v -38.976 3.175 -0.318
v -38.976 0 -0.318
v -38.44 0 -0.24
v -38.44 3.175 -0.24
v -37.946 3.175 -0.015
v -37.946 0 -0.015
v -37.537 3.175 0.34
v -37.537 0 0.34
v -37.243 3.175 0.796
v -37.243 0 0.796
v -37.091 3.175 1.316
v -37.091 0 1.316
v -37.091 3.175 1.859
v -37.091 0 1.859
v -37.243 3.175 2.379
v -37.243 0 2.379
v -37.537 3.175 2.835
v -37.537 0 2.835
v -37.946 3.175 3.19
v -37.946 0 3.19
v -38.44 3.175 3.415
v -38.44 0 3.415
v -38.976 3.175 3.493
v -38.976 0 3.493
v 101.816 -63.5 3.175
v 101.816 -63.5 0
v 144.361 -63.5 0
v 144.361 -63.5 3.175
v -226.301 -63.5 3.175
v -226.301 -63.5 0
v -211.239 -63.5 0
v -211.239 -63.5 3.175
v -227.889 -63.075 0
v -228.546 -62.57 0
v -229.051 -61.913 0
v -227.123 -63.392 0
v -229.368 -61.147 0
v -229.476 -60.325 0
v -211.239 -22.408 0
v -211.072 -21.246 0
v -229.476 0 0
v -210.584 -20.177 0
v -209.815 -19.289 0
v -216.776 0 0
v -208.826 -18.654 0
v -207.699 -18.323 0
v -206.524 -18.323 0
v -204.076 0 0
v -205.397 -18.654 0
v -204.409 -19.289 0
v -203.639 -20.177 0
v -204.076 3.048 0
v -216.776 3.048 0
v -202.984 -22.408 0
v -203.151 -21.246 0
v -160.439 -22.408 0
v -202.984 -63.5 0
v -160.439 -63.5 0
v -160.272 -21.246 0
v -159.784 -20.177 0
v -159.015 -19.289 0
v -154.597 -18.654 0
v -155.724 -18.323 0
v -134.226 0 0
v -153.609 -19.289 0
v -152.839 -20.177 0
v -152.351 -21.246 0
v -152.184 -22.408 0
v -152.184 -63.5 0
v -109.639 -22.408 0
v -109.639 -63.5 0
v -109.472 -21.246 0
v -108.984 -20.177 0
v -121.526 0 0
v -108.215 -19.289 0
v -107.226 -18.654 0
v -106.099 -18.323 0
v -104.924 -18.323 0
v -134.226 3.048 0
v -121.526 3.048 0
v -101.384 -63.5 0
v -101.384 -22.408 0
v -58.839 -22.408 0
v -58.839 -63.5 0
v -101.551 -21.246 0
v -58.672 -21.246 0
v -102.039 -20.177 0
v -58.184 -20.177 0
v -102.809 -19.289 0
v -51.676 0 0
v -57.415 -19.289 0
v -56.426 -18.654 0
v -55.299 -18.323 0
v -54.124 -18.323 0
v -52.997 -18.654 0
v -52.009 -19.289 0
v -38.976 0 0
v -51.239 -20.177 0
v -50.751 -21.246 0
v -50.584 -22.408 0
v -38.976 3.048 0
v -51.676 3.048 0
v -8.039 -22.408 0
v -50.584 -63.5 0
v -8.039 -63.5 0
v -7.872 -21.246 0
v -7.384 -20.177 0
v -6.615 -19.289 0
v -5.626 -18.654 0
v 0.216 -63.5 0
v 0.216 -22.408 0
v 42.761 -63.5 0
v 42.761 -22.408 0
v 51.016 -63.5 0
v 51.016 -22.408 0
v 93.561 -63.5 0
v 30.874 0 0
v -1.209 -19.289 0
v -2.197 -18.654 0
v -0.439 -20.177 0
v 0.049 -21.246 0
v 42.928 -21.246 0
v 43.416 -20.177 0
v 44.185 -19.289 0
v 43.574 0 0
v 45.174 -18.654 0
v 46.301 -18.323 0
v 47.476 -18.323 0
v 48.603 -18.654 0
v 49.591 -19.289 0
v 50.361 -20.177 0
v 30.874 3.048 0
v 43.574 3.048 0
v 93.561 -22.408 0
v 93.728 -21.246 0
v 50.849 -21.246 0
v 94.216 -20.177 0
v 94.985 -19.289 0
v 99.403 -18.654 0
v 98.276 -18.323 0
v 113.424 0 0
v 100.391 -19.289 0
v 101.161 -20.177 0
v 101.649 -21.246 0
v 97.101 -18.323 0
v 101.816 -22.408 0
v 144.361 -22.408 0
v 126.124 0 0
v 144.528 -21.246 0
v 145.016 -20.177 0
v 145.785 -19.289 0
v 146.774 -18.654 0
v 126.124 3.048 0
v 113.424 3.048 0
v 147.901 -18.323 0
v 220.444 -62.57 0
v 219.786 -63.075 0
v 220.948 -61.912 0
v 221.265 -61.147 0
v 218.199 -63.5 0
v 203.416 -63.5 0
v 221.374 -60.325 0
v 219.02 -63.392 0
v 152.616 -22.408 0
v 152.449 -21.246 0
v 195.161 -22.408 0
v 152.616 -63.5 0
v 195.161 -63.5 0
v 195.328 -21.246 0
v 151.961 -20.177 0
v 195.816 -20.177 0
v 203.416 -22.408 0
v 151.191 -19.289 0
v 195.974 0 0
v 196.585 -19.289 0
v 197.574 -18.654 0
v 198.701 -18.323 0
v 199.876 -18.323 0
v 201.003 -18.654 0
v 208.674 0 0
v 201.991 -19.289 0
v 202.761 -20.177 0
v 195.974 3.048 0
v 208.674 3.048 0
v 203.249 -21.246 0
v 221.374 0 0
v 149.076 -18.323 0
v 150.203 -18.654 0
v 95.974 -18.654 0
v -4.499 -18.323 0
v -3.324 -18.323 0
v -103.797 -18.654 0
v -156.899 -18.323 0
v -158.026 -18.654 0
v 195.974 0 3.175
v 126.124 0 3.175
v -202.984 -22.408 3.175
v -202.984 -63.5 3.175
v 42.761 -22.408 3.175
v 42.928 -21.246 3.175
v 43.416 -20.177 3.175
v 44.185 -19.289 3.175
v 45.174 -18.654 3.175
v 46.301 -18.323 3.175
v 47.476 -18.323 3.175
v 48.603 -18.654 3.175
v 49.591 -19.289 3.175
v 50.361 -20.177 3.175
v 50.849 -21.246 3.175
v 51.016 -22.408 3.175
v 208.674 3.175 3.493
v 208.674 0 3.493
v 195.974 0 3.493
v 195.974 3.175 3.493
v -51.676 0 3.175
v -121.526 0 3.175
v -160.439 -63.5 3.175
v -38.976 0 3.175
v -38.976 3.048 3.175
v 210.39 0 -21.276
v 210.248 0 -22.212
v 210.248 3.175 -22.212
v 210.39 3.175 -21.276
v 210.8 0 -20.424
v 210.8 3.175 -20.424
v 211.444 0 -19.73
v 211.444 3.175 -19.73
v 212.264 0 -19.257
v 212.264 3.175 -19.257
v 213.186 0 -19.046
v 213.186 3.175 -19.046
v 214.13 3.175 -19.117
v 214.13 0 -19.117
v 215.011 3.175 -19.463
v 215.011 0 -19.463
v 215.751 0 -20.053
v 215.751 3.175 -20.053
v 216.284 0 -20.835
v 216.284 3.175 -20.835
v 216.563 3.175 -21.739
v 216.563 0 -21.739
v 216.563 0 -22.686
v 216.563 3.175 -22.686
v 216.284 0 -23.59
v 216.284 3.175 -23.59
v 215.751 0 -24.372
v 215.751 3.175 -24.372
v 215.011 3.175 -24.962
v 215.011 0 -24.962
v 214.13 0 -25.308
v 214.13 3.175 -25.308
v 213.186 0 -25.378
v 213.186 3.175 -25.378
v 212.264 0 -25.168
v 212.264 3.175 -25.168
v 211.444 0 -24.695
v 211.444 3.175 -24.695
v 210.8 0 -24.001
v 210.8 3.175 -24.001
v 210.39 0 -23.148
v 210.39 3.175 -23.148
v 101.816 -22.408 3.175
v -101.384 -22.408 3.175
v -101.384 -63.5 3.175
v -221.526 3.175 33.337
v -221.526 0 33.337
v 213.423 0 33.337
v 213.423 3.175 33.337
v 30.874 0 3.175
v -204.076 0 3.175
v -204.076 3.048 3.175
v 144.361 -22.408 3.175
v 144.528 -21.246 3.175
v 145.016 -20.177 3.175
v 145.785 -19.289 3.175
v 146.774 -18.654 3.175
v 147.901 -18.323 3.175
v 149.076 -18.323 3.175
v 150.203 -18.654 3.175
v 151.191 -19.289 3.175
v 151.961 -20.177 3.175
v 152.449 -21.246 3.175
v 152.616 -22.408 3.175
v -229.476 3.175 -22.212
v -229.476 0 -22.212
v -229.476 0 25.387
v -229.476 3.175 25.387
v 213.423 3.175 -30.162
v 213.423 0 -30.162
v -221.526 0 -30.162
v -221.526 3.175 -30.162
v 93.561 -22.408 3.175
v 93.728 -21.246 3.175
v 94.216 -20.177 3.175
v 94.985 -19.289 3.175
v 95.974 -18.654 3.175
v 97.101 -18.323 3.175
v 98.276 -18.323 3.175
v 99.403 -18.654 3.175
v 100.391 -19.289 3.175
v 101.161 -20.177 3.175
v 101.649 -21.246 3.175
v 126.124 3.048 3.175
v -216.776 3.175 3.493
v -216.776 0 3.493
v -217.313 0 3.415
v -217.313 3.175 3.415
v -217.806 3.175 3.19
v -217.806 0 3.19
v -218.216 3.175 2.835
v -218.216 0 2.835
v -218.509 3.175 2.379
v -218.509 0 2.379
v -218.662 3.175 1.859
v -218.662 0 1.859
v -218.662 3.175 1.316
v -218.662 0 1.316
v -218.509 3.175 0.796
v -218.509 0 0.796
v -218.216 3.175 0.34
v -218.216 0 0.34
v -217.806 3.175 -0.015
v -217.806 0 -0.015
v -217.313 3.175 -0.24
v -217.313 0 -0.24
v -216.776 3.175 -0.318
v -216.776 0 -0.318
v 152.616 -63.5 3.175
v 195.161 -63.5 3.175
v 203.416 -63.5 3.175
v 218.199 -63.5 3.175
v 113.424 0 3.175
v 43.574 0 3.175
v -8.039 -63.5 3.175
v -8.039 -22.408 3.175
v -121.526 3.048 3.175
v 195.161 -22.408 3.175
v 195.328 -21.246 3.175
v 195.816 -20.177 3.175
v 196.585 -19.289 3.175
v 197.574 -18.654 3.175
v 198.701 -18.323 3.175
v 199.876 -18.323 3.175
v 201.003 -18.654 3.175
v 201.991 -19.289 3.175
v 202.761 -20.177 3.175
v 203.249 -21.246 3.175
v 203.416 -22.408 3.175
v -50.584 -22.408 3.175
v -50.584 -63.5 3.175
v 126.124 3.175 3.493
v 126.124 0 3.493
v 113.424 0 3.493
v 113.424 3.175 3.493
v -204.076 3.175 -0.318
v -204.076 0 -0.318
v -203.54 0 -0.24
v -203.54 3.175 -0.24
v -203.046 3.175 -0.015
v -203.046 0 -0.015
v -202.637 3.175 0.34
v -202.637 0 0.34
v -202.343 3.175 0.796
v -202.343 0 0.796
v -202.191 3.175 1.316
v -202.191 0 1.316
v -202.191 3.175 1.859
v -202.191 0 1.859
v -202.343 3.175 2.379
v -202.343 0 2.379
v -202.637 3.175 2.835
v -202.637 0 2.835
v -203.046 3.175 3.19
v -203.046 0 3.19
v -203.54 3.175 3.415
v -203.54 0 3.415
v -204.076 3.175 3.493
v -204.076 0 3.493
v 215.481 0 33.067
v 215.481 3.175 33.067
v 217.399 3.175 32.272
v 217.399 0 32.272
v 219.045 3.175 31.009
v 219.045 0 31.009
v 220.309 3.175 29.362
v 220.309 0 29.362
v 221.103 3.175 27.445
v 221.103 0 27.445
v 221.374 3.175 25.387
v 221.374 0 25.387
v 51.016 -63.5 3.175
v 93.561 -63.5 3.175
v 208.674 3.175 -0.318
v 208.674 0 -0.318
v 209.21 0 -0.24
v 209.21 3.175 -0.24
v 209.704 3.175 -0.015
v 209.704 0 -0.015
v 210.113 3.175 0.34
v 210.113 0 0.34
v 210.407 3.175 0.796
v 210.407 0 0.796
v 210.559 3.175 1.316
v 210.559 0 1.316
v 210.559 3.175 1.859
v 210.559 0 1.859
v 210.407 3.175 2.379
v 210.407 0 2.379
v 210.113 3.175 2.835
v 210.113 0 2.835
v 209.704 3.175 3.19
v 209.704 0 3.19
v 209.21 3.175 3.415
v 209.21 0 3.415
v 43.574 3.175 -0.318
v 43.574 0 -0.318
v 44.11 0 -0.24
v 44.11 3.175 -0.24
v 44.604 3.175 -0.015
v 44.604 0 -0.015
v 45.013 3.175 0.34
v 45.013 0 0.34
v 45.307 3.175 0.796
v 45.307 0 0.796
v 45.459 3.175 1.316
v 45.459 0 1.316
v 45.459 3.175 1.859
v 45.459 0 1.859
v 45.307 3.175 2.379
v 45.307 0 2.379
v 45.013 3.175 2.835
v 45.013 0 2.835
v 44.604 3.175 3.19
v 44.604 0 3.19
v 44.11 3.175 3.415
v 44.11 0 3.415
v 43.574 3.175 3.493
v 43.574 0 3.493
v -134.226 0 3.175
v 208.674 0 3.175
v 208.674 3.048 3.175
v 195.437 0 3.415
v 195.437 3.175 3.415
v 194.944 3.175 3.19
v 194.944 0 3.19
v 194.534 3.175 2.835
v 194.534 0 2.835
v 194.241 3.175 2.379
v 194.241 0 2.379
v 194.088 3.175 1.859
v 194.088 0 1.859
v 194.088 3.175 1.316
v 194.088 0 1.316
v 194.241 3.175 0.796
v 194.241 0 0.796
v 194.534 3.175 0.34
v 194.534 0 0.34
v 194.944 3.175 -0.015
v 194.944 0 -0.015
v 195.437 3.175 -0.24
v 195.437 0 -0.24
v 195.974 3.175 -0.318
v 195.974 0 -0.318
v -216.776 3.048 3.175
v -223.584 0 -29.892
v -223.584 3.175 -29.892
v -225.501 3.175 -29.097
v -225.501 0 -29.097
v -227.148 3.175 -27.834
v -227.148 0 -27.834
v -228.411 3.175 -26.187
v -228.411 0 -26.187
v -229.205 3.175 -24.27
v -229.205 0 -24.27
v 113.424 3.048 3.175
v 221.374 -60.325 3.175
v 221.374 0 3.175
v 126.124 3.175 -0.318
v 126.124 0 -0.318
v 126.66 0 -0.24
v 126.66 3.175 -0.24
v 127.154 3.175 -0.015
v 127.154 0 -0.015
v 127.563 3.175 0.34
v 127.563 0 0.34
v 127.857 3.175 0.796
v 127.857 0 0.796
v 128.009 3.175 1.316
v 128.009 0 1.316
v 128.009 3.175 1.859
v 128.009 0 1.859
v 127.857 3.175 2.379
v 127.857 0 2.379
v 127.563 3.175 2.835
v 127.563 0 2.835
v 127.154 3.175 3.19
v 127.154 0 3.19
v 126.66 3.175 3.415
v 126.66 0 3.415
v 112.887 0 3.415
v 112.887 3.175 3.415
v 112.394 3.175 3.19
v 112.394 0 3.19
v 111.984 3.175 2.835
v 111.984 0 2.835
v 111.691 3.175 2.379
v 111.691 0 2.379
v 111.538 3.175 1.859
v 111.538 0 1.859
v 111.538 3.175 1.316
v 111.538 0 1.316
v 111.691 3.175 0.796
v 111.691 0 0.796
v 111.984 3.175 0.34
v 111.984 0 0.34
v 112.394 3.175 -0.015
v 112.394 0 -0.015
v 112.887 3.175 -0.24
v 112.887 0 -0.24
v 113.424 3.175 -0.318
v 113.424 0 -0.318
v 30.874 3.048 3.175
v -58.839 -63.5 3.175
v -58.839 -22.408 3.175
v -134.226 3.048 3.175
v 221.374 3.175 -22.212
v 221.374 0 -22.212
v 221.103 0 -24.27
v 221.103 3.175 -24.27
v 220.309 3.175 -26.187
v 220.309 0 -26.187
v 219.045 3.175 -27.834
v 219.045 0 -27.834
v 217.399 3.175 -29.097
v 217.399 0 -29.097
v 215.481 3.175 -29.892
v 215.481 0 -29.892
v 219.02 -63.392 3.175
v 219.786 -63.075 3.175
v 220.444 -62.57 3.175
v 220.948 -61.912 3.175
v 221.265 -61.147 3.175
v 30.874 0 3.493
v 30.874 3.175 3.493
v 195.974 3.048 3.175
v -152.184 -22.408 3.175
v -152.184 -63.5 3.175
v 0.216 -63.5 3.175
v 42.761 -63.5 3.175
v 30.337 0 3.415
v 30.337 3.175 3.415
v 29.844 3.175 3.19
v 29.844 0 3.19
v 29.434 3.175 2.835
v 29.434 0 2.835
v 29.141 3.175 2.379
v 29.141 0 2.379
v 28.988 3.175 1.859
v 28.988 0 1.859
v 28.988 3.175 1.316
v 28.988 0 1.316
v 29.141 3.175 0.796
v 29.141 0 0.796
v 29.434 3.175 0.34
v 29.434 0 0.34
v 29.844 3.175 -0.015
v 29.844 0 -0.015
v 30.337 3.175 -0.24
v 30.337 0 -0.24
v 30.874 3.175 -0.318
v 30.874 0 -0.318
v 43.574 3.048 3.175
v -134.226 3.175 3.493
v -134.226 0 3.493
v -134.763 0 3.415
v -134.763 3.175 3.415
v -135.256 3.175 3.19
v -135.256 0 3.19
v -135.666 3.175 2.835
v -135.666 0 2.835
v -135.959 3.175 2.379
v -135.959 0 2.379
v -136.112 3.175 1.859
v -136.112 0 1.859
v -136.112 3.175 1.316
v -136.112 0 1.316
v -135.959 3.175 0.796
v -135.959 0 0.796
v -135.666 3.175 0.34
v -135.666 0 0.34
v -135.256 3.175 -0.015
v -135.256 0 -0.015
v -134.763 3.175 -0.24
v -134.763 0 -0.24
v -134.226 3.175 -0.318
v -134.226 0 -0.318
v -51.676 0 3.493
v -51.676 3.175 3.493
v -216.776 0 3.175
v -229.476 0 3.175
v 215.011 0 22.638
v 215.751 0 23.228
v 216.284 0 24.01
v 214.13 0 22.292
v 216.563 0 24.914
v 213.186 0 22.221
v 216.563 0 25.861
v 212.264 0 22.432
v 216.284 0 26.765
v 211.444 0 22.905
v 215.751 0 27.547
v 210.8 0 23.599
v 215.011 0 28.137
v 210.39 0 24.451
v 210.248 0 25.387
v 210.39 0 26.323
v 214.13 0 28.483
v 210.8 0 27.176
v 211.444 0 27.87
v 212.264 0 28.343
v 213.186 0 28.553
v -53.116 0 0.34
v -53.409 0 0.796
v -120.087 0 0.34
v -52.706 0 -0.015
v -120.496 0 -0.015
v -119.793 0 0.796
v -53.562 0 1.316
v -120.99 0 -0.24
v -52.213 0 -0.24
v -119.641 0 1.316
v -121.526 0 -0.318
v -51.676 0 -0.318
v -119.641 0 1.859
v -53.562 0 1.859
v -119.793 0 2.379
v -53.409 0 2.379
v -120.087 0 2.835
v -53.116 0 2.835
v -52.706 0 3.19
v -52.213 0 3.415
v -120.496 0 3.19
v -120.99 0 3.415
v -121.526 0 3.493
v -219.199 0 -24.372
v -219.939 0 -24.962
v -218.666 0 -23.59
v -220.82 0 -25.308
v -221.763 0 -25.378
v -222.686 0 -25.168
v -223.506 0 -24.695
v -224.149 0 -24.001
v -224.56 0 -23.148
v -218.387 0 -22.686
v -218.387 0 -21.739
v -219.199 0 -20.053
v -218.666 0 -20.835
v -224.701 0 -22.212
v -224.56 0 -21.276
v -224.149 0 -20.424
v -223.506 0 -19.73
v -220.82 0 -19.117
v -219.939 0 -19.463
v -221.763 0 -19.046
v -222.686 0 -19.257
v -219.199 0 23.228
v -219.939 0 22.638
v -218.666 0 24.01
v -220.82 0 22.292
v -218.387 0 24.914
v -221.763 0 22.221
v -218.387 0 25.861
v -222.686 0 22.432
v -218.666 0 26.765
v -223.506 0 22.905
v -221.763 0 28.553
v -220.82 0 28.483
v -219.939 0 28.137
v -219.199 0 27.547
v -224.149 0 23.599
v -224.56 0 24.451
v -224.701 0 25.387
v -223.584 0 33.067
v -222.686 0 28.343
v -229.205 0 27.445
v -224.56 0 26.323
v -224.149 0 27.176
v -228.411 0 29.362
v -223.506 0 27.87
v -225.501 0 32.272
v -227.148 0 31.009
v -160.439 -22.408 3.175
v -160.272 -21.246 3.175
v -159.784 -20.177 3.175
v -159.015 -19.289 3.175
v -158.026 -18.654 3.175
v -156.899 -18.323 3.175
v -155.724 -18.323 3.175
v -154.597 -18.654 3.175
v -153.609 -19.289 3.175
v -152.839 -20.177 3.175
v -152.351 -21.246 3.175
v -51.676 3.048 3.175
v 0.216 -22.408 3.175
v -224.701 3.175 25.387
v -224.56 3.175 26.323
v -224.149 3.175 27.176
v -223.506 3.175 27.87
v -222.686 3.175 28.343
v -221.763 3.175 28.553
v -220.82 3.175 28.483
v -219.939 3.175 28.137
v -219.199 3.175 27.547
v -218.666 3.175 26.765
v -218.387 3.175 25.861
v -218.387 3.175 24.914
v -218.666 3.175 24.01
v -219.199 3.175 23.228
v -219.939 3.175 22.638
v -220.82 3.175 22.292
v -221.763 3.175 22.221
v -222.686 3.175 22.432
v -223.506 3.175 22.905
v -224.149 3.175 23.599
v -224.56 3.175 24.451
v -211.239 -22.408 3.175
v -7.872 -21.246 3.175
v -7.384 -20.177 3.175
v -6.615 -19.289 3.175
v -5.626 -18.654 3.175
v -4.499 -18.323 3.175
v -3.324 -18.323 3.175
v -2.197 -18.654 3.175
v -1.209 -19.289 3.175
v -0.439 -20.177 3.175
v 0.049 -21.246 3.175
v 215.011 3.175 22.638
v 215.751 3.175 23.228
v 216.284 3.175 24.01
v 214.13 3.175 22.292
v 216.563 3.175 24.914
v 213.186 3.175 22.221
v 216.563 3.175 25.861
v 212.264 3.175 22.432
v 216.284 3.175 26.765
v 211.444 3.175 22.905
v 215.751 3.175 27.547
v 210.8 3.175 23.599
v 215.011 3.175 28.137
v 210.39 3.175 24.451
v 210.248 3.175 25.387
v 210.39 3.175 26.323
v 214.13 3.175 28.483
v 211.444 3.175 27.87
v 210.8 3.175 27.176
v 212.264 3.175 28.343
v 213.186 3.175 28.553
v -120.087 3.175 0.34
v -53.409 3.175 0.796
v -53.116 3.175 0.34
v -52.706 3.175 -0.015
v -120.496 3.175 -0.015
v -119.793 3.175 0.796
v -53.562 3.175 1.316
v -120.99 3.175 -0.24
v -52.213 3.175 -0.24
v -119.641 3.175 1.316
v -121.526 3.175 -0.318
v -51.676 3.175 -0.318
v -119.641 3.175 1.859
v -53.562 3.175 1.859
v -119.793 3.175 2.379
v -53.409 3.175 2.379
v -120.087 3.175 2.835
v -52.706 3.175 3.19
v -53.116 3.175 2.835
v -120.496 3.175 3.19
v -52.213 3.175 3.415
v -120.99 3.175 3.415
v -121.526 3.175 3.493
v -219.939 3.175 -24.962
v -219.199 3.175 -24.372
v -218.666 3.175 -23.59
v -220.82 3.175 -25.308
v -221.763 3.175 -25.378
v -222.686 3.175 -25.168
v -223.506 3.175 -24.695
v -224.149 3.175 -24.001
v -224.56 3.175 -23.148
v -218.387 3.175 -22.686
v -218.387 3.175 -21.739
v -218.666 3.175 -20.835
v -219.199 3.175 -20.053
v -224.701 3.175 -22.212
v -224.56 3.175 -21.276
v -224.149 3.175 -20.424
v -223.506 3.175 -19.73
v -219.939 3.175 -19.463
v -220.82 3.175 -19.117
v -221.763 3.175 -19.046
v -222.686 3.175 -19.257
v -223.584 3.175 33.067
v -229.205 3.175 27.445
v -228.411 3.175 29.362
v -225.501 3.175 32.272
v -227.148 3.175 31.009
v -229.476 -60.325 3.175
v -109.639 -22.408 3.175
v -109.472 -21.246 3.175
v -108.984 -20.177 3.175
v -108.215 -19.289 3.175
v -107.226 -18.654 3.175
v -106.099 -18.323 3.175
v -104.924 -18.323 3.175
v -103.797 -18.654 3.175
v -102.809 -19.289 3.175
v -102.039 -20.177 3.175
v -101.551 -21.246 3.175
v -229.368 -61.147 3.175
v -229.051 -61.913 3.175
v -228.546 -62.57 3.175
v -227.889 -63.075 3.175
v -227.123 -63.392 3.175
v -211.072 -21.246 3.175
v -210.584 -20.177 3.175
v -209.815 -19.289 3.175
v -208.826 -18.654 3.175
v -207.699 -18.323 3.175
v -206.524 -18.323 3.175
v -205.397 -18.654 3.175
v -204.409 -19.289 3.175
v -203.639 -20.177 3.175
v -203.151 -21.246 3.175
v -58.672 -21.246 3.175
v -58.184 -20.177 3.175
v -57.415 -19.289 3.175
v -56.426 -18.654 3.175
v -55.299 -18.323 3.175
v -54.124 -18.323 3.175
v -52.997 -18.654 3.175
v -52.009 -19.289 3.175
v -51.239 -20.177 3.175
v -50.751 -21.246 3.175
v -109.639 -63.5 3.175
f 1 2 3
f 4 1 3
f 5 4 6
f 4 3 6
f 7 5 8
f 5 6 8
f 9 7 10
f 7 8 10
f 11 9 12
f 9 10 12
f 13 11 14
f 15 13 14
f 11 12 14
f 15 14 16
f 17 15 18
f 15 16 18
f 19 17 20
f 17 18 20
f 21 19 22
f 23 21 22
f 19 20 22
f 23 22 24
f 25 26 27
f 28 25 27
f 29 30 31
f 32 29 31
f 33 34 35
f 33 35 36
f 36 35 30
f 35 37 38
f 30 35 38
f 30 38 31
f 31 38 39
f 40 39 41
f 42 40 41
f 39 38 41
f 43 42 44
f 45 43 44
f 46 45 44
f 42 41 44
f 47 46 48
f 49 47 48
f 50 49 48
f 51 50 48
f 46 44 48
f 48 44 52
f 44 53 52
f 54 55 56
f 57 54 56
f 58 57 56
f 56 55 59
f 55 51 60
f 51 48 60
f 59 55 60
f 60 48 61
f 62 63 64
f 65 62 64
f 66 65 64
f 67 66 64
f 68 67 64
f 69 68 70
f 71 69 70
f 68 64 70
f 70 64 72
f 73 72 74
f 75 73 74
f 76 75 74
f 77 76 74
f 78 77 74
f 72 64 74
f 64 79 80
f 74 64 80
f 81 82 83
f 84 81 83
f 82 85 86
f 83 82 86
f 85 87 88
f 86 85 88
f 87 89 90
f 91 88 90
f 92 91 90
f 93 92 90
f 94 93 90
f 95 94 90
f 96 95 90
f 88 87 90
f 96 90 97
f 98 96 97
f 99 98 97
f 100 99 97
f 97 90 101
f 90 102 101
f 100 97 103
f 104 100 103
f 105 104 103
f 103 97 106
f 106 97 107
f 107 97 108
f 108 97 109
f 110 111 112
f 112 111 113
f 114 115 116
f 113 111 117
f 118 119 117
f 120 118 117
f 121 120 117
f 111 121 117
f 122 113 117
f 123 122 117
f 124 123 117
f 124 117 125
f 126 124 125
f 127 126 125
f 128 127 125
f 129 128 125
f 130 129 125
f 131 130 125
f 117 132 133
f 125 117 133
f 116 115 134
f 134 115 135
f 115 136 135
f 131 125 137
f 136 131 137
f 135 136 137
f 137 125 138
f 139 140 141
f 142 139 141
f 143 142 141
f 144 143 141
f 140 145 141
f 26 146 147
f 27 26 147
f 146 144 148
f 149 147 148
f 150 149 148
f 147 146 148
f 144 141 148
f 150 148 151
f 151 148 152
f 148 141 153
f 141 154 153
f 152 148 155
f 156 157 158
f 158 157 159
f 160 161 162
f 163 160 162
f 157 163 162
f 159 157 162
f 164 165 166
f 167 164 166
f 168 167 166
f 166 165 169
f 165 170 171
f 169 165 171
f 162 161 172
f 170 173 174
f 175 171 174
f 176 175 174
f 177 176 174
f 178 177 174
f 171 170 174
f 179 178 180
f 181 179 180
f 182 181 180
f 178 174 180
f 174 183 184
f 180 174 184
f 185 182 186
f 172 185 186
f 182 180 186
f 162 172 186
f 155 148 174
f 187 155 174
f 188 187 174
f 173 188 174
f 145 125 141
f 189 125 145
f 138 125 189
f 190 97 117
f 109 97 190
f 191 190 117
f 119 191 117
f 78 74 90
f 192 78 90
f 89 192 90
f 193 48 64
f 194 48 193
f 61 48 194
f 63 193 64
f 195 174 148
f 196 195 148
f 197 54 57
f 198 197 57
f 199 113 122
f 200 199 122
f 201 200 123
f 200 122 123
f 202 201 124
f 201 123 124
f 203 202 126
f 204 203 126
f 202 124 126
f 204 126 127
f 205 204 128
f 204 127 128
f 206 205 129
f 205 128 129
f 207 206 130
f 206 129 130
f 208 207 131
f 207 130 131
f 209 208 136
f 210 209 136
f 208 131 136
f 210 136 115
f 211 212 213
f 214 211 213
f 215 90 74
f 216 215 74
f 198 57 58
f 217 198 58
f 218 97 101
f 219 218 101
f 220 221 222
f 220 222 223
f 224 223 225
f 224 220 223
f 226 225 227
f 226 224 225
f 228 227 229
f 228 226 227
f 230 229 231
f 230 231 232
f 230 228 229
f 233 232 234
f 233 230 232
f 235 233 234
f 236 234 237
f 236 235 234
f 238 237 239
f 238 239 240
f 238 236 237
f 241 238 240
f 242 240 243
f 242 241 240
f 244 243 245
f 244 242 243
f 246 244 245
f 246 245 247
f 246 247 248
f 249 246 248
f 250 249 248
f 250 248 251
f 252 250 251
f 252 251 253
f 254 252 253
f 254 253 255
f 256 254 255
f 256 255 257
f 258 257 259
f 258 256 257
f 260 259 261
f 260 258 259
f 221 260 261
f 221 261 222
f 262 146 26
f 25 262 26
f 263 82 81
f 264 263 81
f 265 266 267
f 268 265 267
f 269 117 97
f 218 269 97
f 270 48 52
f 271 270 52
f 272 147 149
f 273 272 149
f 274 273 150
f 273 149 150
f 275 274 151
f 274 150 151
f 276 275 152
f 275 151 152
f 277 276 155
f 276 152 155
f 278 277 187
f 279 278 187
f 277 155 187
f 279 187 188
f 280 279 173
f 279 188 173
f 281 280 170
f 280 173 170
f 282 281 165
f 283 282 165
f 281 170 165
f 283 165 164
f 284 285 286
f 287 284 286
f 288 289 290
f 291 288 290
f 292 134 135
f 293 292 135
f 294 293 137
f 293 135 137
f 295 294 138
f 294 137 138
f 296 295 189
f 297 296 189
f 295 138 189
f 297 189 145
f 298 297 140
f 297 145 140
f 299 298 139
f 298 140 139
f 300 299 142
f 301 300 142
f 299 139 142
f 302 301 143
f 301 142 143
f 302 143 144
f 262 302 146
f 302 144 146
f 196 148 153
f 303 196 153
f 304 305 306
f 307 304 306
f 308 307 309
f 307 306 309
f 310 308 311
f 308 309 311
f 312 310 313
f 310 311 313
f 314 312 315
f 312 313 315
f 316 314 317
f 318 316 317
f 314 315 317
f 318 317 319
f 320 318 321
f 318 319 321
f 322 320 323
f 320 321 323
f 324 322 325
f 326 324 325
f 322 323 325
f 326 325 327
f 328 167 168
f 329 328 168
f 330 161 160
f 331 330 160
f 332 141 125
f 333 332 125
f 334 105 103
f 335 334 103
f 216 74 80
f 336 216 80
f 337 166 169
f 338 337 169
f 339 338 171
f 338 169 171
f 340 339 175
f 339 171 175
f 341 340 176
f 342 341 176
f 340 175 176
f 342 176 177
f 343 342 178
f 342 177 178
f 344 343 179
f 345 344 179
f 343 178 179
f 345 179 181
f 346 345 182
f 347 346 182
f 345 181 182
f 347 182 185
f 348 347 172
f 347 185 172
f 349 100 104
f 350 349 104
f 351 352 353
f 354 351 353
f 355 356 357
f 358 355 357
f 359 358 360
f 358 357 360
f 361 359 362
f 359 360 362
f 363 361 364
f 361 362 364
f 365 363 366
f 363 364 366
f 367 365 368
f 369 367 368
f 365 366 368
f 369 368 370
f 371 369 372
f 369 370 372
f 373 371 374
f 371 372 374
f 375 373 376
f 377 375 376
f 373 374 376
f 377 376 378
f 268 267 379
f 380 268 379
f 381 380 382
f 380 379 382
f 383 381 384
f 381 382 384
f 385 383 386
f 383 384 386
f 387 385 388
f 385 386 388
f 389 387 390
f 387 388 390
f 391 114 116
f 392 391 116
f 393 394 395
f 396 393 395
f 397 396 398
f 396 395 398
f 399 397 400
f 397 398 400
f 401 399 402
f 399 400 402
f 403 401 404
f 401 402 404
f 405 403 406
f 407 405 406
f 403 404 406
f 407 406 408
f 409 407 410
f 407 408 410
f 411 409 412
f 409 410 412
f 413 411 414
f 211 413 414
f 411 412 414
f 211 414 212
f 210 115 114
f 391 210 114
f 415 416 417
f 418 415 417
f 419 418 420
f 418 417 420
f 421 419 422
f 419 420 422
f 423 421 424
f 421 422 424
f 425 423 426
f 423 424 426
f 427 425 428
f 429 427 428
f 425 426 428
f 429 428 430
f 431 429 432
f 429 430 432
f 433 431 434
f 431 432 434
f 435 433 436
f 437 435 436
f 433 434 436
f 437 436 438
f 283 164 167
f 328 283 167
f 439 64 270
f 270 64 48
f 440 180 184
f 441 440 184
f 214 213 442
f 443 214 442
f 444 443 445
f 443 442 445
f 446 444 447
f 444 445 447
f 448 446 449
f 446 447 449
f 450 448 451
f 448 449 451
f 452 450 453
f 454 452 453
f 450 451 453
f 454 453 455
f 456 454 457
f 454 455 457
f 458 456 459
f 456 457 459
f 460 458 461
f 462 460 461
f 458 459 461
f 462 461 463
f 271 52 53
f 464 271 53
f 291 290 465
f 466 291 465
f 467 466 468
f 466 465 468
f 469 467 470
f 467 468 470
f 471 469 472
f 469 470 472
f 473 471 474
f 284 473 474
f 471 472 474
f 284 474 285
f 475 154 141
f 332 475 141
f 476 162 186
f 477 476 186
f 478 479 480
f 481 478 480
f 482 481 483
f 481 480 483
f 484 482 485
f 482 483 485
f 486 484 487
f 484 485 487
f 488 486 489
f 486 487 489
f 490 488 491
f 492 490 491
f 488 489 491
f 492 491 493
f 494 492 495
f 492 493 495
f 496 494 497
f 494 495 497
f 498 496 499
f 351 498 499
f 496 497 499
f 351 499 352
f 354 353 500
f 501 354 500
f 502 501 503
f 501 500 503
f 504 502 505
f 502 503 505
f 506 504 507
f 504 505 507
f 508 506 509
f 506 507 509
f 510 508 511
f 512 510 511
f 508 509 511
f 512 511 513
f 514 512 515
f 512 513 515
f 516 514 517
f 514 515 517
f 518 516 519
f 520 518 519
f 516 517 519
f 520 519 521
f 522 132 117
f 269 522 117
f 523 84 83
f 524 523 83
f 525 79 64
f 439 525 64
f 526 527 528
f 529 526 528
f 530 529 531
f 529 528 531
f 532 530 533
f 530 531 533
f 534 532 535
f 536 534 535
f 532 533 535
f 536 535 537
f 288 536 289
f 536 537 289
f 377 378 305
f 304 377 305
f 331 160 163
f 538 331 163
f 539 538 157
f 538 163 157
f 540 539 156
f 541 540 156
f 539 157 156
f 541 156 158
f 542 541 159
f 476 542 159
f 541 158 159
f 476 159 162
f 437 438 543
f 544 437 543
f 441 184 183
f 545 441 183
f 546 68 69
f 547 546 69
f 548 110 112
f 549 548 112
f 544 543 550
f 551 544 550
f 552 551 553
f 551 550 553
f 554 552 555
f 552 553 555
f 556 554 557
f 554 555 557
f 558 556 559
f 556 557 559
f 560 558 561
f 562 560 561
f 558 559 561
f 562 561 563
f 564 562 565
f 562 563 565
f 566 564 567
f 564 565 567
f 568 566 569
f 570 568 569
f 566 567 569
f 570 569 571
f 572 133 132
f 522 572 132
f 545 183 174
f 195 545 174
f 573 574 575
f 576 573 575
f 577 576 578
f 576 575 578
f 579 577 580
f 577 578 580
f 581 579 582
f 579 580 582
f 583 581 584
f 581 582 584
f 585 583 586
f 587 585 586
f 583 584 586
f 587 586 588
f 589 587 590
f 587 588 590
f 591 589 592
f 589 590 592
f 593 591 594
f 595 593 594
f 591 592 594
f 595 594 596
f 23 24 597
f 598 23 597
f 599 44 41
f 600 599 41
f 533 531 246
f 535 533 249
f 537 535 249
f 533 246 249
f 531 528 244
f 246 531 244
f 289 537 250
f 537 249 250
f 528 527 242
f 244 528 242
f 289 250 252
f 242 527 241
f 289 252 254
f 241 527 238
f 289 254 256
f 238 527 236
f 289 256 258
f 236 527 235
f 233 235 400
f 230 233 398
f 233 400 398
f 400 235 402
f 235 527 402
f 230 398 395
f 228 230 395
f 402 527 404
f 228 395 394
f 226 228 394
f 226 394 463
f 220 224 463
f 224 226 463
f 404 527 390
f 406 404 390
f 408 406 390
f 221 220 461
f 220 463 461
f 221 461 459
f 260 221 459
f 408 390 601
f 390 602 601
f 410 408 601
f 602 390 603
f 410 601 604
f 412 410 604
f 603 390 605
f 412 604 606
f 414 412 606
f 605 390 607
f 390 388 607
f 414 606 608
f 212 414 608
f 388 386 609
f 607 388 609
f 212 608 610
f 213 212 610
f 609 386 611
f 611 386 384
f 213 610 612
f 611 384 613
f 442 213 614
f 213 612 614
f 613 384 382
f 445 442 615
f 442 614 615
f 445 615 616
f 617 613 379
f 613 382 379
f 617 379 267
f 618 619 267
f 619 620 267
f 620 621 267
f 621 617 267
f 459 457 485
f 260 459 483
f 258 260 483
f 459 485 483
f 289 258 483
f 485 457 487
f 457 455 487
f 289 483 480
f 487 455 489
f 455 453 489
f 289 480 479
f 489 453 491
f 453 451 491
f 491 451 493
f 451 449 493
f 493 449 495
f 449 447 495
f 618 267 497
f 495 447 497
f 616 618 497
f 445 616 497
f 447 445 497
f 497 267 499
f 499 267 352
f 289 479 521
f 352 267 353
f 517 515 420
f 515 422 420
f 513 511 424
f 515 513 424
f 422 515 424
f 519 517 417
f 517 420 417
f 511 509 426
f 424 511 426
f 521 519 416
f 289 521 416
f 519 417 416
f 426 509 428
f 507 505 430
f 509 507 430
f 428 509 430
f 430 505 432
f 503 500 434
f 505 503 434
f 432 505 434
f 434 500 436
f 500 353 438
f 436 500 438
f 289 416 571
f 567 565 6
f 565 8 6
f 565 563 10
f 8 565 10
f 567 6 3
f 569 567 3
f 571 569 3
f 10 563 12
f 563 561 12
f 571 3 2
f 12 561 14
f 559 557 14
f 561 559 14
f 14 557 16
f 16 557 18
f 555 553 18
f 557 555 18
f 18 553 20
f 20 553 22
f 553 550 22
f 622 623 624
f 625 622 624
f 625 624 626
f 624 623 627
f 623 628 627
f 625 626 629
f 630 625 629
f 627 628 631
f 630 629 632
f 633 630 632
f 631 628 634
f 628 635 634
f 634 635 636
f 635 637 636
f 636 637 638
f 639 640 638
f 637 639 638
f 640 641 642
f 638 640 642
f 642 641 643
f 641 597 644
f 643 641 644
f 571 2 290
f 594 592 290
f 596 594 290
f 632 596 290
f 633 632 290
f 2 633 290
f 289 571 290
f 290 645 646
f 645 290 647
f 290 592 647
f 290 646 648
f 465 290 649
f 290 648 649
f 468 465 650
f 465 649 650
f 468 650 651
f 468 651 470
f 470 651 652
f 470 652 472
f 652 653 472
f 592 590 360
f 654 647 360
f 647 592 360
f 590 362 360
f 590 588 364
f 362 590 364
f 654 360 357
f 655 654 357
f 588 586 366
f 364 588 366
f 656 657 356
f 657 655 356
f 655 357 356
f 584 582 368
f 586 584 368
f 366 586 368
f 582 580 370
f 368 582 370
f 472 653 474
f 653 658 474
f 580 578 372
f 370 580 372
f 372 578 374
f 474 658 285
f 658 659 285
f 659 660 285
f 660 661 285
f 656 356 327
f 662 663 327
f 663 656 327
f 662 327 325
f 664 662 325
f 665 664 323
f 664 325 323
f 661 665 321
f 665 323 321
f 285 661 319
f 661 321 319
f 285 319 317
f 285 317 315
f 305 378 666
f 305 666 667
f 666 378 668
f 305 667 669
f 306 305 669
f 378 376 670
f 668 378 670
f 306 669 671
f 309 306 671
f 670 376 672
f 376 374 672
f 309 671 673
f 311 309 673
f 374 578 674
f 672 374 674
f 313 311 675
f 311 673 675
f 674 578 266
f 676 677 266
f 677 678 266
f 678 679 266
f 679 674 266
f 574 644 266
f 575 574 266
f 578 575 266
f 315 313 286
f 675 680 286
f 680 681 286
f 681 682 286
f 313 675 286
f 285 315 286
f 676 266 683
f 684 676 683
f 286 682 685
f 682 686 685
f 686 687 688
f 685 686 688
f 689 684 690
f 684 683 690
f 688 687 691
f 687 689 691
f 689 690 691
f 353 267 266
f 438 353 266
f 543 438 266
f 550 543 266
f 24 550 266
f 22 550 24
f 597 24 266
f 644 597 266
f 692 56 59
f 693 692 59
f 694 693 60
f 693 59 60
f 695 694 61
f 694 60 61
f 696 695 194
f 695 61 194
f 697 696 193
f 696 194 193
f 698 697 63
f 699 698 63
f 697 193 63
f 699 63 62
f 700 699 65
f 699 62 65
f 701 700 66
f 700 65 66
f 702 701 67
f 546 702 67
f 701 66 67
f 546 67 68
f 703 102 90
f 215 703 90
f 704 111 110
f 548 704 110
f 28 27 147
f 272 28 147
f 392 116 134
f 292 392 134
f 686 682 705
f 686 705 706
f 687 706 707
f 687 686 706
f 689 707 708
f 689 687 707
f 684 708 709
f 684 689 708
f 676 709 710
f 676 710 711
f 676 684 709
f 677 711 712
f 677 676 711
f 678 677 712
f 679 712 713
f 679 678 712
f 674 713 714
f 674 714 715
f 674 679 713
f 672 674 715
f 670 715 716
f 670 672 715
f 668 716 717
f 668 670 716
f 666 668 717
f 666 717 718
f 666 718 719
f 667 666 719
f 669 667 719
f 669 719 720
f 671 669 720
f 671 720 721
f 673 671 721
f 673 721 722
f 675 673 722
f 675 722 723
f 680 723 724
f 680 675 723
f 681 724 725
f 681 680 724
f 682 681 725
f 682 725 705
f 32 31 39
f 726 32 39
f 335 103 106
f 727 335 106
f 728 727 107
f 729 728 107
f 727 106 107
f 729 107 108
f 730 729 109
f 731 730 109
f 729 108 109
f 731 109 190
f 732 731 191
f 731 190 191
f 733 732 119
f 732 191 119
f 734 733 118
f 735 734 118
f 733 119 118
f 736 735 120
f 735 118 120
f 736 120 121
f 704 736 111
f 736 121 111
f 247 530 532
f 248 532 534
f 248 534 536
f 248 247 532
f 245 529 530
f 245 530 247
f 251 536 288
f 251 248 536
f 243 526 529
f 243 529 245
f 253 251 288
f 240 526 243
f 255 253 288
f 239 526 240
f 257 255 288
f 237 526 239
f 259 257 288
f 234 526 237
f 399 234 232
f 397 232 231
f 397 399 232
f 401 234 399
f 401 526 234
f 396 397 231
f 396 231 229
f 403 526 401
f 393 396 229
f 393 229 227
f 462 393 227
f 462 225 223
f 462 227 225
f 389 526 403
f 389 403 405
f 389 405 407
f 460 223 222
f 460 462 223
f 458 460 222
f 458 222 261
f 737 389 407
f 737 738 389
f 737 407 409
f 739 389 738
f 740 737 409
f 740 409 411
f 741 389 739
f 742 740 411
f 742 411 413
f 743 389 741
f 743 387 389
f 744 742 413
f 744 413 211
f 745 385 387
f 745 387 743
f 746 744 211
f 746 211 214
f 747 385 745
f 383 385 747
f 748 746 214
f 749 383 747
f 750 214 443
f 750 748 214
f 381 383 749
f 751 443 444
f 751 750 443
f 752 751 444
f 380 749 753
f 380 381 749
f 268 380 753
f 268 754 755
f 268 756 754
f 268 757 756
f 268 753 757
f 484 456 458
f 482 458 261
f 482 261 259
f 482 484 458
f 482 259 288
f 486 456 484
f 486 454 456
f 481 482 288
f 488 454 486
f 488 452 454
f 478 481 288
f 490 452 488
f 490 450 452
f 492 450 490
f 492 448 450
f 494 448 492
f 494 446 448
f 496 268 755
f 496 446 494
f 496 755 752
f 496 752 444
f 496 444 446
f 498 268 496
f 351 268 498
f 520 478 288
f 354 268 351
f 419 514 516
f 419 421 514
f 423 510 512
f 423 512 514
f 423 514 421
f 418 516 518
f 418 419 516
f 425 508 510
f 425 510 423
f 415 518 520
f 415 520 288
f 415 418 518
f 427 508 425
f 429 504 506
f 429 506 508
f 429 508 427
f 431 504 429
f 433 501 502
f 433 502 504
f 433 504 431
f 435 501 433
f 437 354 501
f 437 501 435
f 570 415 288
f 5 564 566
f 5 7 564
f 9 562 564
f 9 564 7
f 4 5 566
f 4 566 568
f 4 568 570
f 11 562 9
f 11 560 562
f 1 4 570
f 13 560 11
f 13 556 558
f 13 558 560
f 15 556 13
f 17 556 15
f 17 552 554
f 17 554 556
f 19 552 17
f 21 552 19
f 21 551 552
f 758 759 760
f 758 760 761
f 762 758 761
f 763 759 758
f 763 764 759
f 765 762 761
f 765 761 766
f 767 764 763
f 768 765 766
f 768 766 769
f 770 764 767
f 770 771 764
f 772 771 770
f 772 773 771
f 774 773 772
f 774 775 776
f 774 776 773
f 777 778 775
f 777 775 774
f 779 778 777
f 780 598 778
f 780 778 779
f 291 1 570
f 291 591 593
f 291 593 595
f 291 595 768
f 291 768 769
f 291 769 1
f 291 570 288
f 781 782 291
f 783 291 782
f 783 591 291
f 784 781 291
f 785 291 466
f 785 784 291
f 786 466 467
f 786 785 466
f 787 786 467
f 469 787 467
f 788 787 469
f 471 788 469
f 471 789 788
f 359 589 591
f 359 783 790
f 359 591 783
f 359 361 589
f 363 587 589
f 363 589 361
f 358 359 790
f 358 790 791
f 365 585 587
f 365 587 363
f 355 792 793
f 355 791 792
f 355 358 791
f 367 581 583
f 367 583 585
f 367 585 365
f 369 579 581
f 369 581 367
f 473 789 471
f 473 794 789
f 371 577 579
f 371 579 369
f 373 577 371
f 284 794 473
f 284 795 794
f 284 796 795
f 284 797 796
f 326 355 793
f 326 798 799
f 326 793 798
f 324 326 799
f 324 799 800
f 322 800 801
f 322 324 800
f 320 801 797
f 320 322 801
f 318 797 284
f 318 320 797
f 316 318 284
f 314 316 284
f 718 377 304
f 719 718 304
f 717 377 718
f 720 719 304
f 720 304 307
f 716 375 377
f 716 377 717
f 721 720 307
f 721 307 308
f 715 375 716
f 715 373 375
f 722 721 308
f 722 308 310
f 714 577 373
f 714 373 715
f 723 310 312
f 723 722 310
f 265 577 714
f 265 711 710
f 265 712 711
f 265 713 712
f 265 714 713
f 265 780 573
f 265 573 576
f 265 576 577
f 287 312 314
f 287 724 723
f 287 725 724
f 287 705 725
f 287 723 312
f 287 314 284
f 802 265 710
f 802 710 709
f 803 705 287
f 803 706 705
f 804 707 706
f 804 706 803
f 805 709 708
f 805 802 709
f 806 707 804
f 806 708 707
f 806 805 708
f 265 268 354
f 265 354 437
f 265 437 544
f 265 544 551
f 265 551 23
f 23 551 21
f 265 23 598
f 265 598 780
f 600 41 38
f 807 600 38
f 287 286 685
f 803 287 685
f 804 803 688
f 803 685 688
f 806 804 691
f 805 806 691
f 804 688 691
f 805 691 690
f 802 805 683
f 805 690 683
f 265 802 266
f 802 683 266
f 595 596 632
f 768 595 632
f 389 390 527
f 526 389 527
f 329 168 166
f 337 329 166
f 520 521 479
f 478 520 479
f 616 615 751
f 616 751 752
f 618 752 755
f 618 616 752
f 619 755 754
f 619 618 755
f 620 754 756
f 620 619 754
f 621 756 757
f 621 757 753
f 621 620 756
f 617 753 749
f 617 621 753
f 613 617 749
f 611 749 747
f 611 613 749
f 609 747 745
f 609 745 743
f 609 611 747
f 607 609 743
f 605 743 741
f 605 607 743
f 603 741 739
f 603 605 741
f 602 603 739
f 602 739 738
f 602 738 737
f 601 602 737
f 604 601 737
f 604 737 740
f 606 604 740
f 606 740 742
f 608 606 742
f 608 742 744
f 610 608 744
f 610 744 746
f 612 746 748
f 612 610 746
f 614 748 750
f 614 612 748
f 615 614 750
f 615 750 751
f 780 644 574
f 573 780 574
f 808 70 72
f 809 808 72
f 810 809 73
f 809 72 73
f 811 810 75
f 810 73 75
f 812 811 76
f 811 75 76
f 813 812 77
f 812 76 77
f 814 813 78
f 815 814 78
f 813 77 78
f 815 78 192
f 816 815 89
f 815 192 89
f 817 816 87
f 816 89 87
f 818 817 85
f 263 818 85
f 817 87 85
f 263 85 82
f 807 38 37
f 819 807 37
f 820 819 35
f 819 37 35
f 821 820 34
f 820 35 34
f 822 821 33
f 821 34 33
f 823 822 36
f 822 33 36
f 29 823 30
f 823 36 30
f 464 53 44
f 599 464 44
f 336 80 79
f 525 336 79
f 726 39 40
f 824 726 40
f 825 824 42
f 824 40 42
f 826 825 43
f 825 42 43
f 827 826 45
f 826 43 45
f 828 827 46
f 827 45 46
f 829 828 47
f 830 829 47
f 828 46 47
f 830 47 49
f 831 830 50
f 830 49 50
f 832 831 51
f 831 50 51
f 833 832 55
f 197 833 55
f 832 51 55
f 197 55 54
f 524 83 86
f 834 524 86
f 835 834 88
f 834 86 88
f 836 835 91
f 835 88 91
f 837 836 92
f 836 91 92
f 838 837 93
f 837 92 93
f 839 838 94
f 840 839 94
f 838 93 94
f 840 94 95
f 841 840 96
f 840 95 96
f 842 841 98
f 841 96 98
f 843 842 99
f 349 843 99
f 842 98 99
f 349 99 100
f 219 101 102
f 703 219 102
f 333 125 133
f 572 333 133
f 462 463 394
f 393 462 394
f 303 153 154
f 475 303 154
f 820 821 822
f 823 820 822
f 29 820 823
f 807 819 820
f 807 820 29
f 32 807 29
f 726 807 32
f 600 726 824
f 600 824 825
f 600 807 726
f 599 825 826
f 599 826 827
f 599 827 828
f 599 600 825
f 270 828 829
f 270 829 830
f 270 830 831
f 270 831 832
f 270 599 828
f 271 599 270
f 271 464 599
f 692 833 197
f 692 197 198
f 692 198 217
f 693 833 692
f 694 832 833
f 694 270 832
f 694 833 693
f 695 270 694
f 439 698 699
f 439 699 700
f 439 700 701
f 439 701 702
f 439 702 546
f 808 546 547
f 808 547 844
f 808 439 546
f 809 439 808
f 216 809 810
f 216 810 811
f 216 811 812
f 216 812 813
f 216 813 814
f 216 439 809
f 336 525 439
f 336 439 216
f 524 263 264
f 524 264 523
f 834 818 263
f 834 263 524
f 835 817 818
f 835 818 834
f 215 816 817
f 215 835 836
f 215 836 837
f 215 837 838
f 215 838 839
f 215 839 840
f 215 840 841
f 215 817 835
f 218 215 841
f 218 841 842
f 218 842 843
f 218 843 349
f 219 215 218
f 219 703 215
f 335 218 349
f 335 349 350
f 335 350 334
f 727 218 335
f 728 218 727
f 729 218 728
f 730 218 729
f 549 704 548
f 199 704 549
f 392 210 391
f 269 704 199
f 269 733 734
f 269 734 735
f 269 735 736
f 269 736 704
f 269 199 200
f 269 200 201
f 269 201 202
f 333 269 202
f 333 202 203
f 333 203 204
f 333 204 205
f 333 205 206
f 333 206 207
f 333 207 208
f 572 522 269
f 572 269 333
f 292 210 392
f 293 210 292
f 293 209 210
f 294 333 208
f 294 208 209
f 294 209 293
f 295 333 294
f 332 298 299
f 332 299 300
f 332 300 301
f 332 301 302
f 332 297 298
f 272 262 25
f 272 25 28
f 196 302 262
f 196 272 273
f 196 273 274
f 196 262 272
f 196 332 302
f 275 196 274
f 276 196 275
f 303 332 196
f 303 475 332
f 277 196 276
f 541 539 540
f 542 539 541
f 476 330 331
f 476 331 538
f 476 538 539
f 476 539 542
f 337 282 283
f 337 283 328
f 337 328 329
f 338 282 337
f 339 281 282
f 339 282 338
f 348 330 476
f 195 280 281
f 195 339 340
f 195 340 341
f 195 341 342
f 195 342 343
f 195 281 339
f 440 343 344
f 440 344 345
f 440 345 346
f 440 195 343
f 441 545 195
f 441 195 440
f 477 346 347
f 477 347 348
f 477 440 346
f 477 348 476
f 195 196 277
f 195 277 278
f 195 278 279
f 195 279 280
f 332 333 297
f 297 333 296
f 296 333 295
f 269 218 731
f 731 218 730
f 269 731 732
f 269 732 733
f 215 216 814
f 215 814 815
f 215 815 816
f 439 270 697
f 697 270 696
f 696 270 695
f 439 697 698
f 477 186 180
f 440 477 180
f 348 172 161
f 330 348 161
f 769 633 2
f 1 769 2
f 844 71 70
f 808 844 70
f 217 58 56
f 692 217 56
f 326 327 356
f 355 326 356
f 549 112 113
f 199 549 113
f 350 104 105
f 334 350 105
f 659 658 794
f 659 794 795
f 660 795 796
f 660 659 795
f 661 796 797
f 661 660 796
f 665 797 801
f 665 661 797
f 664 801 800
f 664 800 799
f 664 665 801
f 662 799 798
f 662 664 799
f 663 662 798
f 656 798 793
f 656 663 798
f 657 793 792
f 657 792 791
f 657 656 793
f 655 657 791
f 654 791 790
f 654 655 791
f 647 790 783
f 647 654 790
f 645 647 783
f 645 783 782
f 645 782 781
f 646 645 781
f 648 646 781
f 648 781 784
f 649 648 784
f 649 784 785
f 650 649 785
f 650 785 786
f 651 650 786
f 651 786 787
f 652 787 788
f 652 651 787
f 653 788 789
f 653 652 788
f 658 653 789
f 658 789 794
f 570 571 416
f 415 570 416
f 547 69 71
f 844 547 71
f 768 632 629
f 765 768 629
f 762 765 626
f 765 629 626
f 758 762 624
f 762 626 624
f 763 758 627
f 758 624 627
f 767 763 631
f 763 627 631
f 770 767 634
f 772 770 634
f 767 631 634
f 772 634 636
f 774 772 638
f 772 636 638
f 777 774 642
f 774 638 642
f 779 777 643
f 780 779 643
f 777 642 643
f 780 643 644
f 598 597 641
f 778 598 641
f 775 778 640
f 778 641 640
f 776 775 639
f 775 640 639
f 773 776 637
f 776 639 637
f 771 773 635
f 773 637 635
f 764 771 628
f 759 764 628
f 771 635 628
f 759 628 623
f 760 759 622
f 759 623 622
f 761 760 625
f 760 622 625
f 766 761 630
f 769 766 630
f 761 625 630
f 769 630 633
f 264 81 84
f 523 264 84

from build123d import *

# Parameters (mm, degrees)
F1_DEPTH = 3.175
F2_R     = 3.175
F3_DEPTH = 3.175


with BuildPart() as f1:
    # F0 (on Top) → F1 (new body)
    with BuildSketch(Plane.XY):
        with BuildLine():
            Line((-216.7763156652, 0), (-229.4763156652, 0))
            Line((-229.4763156652, 0), (-229.4763156652, -60.325))
            ThreePointArc((-229.4763156652, -60.325), (-228.5463796955, -62.5700640303), (-226.3013156652, -63.5))
            Line((-226.3013156652, -63.5), (-211.2391156652, -63.5))
            Line((-211.2391156652, -63.5), (-211.2391156652, -22.4083778501))
            ThreePointArc((-211.2391156652, -22.4083778501), (-207.1116156652, -18.2808778501), (-202.9841156652, -22.4083778501))
            Line((-202.9841156652, -22.4083778501), (-202.9841156652, -63.5))
            Line((-202.9841156652, -63.5), (-160.4391156652, -63.5))
            Line((-160.4391156652, -63.5), (-160.4391156652, -22.4083778501))
            ThreePointArc((-160.4391156652, -22.4083778501), (-156.3116156652, -18.2808778501), (-152.1841156652, -22.4083778501))
            Line((-152.1841156652, -22.4083778501), (-152.1841156652, -63.5))
            Line((-152.1841156652, -63.5), (-109.6391156652, -63.5))
            Line((-109.6391156652, -63.5), (-109.6391156652, -22.4083778501))
            ThreePointArc((-109.6391156652, -22.4083778501), (-105.5116156652, -18.2808778501), (-101.3841156652, -22.4083778501))
            Line((-101.3841156652, -22.4083778501), (-101.3841156652, -63.5))
            Line((-101.3841156652, -63.5), (-58.8391156652, -63.5))
            Line((-58.8391156652, -63.5), (-58.8391156652, -22.4083778501))
            ThreePointArc((-58.8391156652, -22.4083778501), (-54.7116156652, -18.2808778501), (-50.5841156652, -22.4083778501))
            Line((-50.5841156652, -22.4083778501), (-50.5841156652, -63.5))
            Line((-50.5841156652, -63.5), (-8.0391156652, -63.5))
            Line((-8.0391156652, -63.5), (-8.0391156652, -22.4083778501))
            ThreePointArc((-8.0391156652, -22.4083778501), (-3.9116156652, -18.2808778501), (0.2158843348, -22.4083778501))
            Line((0.2158843348, -22.4083778501), (0.2158843348, -63.5))
            Line((0.2158843348, -63.5), (42.7608843348, -63.5))
            Line((42.7608843348, -63.5), (42.7608843348, -22.4083778501))
            ThreePointArc((42.7608843348, -22.4083778501), (46.8883843348, -18.2808778501), (51.0158843348, -22.4083778501))
            Line((51.0158843348, -22.4083778501), (51.0158843348, -63.5))
            Line((51.0158843348, -63.5), (93.5608843348, -63.5))
            Line((93.5608843348, -63.5), (93.5608843348, -22.4083778501))
            ThreePointArc((93.5608843348, -22.4083778501), (97.6883843348, -18.2808778501), (101.8158843348, -22.4083778501))
            Line((101.8158843348, -22.4083778501), (101.8158843348, -63.5))
            Line((101.8158843348, -63.5), (144.3608843348, -63.5))
            Line((144.3608843348, -63.5), (144.3608843348, -22.4083778501))
            ThreePointArc((144.3608843348, -22.4083778501), (148.4883843348, -18.2808778501), (152.6158843348, -22.4083778501))
            Line((152.6158843348, -22.4083778501), (152.6158843348, -63.5))
            Line((152.6158843348, -63.5), (195.1608843348, -63.5))
            Line((195.1608843348, -63.5), (195.1608843348, -22.4083778501))
            ThreePointArc((195.1608843348, -22.4083778501), (199.2883843348, -18.2808778501), (203.4158843348, -22.4083778501))
            Line((203.4158843348, -22.4083778501), (203.4158843348, -63.5))
            Line((203.4158843348, -63.5), (218.1986843348, -63.5))
            ThreePointArc((218.1986843348, -63.5), (220.443748365, -62.5700640303), (221.3736843348, -60.325))
            Line((221.3736843348, -60.325), (221.3736843348, 0))
            Line((221.3736843348, 0), (208.6736843348, 0))
            Line((208.6736843348, 0), (208.6736843348, 3.048))
            Line((208.6736843348, 3.048), (195.9736843348, 3.048))
            Line((195.9736843348, 3.048), (195.9736843348, 0))
            Line((195.9736843348, 0), (126.1236843348, 0))
            Line((126.1236843348, 0), (126.1236843348, 3.048))
            Line((126.1236843348, 3.048), (113.4236843348, 3.048))
            Line((113.4236843348, 3.048), (113.4236843348, 0))
            Line((113.4236843348, 0), (43.5736843348, 0))
            Line((43.5736843348, 0), (43.5736843348, 3.048))
            Line((43.5736843348, 3.048), (30.8736843348, 3.048))
            Line((30.8736843348, 3.048), (30.8736843348, 0))
            Line((30.8736843348, 0), (-38.9763156652, 0))
            Line((-38.9763156652, 0), (-38.9763156652, 3.048))
            Line((-38.9763156652, 3.048), (-51.6763156652, 3.048))
            Line((-51.6763156652, 3.048), (-51.6763156652, 0))
            Line((-51.6763156652, 0), (-121.5263156652, 0))
            Line((-121.5263156652, 0), (-121.5263156652, 3.048))
            Line((-121.5263156652, 3.048), (-134.2263156652, 3.048))
            Line((-134.2263156652, 3.048), (-134.2263156652, 0))
            Line((-134.2263156652, 0), (-204.0763156652, 0))
            Line((-204.0763156652, 0), (-204.0763156652, 3.048))
            Line((-204.0763156652, 3.048), (-216.7763156652, 3.048))
            Line((-216.7763156652, 3.048), (-216.7763156652, 0))
        make_face()
    extrude(amount=F1_DEPTH)


with BuildPart() as f3:
    # F2 (on face) → F3 (new body)
    with BuildSketch(Plane(origin=(0, 0, 0), x_dir=(-1, 0, 0), z_dir=(0, 1, 0))):
        with BuildLine():
            ThreePointArc((-221.3736843348, -22.2123), (-219.0451246665, -27.8339403318), (-213.4234843348, -30.1625))
            Line((-213.4234843348, -30.1625), (221.5261156652, -30.1625))
            ThreePointArc((221.5261156652, -30.1625), (227.147755997, -27.8339403318), (229.4763156652, -22.2123))
            Line((229.4763156652, -22.2123), (229.4763156652, 25.3873))
            ThreePointArc((229.4763156652, 25.3873), (227.147755997, 31.0089403318), (221.5261156652, 33.3375))
            Line((221.5261156652, 33.3375), (-213.4234843348, 33.3375))
            ThreePointArc((-213.4234843348, 33.3375), (-219.0451246665, 31.0089403318), (-221.3736843348, 25.3873))
            Line((-221.3736843348, 25.3873), (-221.3736843348, -22.2123))
        make_face()
        with Locations((-213.4234843348, -22.2123)):
            Circle(F2_R, mode=Mode.SUBTRACT)
        with Locations((221.5261156652, -22.2123)):
            Circle(F2_R, mode=Mode.SUBTRACT)
        with BuildLine():
            Line((-208.6736843348, 3.4925), (-195.9736843348, 3.4925))
            ThreePointArc((-195.9736843348, 3.4925), (-194.0686843348, 1.5875), (-195.9736843348, -0.3175))
            Line((-195.9736843348, -0.3175), (-208.6736843348, -0.3175))
            ThreePointArc((-208.6736843348, -0.3175), (-210.5786843348, 1.5875), (-208.6736843348, 3.4925))
        make_face(mode=Mode.SUBTRACT)
        with BuildLine():
            Line((-126.1236843348, 3.4925), (-113.4236843348, 3.4925))
            ThreePointArc((-113.4236843348, 3.4925), (-111.5186843348, 1.5875), (-113.4236843348, -0.3175))
            Line((-113.4236843348, -0.3175), (-126.1236843348, -0.3175))
            ThreePointArc((-126.1236843348, -0.3175), (-128.0286843348, 1.5875), (-126.1236843348, 3.4925))
        make_face(mode=Mode.SUBTRACT)
        with BuildLine():
            Line((-43.5736843348, 3.4925), (-30.8736843348, 3.4925))
            ThreePointArc((-30.8736843348, 3.4925), (-28.9686843348, 1.5875), (-30.8736843348, -0.3175))
            Line((-30.8736843348, -0.3175), (-43.5736843348, -0.3175))
            ThreePointArc((-43.5736843348, -0.3175), (-45.4786843348, 1.5875), (-43.5736843348, 3.4925))
        make_face(mode=Mode.SUBTRACT)
        with Locations((-213.4234843348, 25.3873)):
            Circle(F2_R, mode=Mode.SUBTRACT)
        with BuildLine():
            Line((38.9763156652, 3.4925), (51.6763156652, 3.4925))
            ThreePointArc((51.6763156652, 3.4925), (53.5813156652, 1.5875), (51.6763156652, -0.3175))
            Line((51.6763156652, -0.3175), (38.9763156652, -0.3175))
            ThreePointArc((38.9763156652, -0.3175), (37.0713156652, 1.5875), (38.9763156652, 3.4925))
        make_face(mode=Mode.SUBTRACT)
        with BuildLine():
            Line((121.5263156652, 3.4925), (134.2263156652, 3.4925))
            ThreePointArc((134.2263156652, 3.4925), (136.1313156652, 1.5875), (134.2263156652, -0.3175))
            Line((134.2263156652, -0.3175), (121.5263156652, -0.3175))
            ThreePointArc((121.5263156652, -0.3175), (119.6213156652, 1.5875), (121.5263156652, 3.4925))
        make_face(mode=Mode.SUBTRACT)
        with BuildLine():
            Line((204.0763156652, 3.4925), (216.7763156652, 3.4925))
            ThreePointArc((216.7763156652, 3.4925), (218.6813156652, 1.5875), (216.7763156652, -0.3175))
            Line((216.7763156652, -0.3175), (204.0763156652, -0.3175))
            ThreePointArc((204.0763156652, -0.3175), (202.1713156652, 1.5875), (204.0763156652, 3.4925))
        make_face(mode=Mode.SUBTRACT)
        with Locations((221.5261156652, 25.3873)):
            Circle(F2_R, mode=Mode.SUBTRACT)
    extrude(amount=F3_DEPTH)


solid = Compound([f1.part, f3.part])
